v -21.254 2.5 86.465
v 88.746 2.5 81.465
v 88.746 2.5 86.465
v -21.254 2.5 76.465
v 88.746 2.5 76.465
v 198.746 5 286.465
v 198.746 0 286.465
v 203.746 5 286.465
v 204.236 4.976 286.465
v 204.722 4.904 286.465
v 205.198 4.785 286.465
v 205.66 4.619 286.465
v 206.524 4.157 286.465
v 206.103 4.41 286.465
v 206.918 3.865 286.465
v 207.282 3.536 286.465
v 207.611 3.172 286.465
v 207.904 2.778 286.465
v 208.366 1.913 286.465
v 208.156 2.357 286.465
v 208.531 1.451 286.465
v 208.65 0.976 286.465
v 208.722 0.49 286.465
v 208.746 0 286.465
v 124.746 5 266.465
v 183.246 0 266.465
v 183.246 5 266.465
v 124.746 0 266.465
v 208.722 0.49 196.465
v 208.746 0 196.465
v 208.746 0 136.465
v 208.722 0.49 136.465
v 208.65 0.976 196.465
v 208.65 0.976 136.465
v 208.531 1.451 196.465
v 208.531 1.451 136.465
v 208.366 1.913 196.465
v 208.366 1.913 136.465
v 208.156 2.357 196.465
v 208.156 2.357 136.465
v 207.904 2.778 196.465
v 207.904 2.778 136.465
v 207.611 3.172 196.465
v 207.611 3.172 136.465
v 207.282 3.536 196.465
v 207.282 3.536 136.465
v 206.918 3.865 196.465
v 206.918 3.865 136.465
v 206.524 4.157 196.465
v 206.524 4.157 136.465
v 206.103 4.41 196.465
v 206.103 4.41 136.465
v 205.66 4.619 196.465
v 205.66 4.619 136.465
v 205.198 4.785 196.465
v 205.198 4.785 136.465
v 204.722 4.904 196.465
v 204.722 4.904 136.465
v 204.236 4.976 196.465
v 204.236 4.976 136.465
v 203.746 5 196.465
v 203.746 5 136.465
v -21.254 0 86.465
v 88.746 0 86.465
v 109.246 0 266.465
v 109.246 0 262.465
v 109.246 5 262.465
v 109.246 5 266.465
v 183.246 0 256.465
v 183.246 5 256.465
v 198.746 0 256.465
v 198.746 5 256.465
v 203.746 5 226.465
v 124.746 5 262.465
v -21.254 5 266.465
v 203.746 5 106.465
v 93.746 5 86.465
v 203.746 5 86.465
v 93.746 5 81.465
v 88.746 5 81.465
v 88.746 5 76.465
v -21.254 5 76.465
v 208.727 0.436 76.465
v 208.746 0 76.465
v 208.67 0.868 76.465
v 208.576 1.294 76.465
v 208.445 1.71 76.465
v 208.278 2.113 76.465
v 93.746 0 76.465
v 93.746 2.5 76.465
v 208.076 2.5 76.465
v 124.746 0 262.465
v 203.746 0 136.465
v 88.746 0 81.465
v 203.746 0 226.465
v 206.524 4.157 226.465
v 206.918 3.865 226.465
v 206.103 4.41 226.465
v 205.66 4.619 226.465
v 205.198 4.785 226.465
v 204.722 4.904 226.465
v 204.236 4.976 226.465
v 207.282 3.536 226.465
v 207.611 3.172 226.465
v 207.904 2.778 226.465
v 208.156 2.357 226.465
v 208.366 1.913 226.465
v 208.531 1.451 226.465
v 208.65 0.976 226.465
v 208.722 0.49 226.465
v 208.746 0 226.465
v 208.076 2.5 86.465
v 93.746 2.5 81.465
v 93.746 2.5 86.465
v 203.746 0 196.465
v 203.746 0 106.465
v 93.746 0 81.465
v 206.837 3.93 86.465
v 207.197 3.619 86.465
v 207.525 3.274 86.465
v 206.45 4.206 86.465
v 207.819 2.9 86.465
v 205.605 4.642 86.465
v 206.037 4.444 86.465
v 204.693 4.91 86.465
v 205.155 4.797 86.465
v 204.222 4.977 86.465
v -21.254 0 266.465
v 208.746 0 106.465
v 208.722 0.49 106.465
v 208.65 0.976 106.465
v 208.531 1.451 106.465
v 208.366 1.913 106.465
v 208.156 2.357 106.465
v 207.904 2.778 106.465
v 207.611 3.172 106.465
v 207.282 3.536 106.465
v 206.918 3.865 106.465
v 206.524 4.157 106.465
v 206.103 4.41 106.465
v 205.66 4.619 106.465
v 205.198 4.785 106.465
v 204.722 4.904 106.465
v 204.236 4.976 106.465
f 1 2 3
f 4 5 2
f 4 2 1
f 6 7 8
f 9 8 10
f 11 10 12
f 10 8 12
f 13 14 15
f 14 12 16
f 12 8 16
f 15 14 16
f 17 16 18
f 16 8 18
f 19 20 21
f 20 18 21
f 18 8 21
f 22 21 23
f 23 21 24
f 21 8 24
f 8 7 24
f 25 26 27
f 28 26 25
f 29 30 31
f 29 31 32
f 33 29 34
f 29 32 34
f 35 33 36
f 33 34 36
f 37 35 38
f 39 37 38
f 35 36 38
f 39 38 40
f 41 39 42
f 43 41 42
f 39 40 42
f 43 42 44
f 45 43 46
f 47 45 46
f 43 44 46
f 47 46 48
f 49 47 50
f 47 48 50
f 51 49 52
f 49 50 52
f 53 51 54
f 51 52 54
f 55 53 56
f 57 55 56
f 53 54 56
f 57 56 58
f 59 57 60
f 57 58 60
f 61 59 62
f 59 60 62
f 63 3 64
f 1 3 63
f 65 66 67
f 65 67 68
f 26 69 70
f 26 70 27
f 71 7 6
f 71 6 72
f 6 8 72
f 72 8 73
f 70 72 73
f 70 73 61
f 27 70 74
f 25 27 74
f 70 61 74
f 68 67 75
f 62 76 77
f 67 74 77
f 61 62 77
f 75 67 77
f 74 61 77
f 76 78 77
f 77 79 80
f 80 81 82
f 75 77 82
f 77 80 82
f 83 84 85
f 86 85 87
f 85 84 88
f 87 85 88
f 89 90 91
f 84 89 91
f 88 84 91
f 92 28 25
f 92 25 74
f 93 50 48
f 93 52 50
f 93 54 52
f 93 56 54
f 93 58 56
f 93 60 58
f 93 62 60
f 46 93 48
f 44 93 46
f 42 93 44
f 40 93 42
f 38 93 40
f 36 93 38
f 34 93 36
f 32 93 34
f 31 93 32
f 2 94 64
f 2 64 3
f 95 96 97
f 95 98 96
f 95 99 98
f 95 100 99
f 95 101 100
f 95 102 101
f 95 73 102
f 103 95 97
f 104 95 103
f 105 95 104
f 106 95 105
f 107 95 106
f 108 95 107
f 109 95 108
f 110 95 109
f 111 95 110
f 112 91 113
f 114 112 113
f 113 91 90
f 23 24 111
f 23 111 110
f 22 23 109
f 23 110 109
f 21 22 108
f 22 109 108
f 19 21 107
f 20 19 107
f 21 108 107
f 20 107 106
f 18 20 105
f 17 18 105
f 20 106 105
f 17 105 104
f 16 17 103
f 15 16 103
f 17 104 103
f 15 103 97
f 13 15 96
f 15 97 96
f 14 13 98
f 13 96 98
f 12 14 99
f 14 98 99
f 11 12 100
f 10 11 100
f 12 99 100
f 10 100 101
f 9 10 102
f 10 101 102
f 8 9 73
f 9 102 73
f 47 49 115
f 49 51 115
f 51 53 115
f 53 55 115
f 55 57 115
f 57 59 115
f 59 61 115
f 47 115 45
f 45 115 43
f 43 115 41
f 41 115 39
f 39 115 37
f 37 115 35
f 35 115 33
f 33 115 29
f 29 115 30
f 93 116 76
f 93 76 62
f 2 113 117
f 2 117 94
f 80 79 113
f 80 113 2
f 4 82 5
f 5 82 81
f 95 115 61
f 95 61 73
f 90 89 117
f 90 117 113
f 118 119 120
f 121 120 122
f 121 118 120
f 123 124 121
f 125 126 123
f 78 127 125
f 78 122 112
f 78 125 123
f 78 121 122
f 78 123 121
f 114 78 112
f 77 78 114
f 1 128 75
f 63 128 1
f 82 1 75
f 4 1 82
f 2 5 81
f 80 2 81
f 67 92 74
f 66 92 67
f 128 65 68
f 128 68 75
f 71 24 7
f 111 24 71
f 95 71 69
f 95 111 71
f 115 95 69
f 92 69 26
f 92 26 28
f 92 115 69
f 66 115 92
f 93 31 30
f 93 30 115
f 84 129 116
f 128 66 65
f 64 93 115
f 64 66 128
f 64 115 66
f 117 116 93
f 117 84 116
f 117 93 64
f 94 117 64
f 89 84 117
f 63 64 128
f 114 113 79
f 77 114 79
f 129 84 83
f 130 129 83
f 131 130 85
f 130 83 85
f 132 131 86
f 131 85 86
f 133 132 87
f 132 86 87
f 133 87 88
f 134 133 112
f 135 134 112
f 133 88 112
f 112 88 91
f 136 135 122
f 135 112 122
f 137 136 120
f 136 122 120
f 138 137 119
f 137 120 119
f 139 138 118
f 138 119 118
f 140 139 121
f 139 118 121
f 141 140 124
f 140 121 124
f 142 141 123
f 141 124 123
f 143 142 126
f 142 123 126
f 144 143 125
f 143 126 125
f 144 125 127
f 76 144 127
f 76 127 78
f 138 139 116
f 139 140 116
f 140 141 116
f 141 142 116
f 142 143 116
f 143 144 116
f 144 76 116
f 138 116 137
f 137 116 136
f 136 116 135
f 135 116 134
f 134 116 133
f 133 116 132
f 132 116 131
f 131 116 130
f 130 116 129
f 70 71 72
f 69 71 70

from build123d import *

# Parameters (mm, degrees)
SKETCH_1_W          = 5
SKETCH_1_H          = 60
SKETCH_1_W_2        = 30
SKETCH_1_H_2        = 5
SKETCH_1_W_3        = 15
EXTRUDE_1_DEPTH     = 5
FILLET_1_R          = 5
SKETCH_2_W          = 245
SKETCH_2_H          = 125
CUT_EXTRUDE_1_DEPTH = 5
SKETCH_3_W          = 110
SKETCH_3_H          = 2.5
SKETCH_3_W_2        = 115
CUT_EXTRUDE_2_DEPTH = 10
SKETCH_4_W          = 5
SKETCH_4_H          = 5
CUT_EXTRUDE_3_DEPTH = 5


with BuildPart() as part:
    # 草圖1 → 填料-伸長1 (new body)
    with BuildSketch(Plane(origin=(0, 0, 0), x_dir=(1, 0, 0), z_dir=(0, 1, 0))):
        Polygon((198.746286718, -286.464902661), (198.746286718, -256.464902661), (183.246286718, -256.464902661), (183.246286718, -266.464902661), (124.746286718, -266.464902661), (124.746286718, -262.464902661), (109.246286718, -262.464902661), (109.246286718, -266.464902661), (-21.253713282, -266.464902661), (-21.253713282, 38.535097339), (-36.253713282, 38.535097339), (-36.253713282, 43.535097339), (203.746286718, 43.535097339), (203.746286718, -286.464902661), align=None)
        with Locations((206.246286718, -256.464902661)):
            Rectangle(SKETCH_1_W, SKETCH_1_H)
        with Locations((206.246286718, 13.535097339)):
            Rectangle(SKETCH_1_W, SKETCH_1_H)
        with Locations((188.746286718, 46.035097339)):
            Rectangle(SKETCH_1_W_2, SKETCH_1_H_2)
        with Locations((-21.253713282, 46.035097339)):
            Rectangle(SKETCH_1_W_2, SKETCH_1_H_2)
        with Locations((91.246286718, 46.035097339)):
            Rectangle(SKETCH_1_W_3, SKETCH_1_H_2)
        with Locations((76.246286718, 46.035097339)):
            Rectangle(SKETCH_1_W_3, SKETCH_1_H_2)
        with Locations((206.246286718, -166.464902661)):
            Rectangle(SKETCH_1_W, SKETCH_1_H)
        with Locations((206.246286718, -76.464902661)):
            Rectangle(SKETCH_1_W, SKETCH_1_H)
    extrude(amount=EXTRUDE_1_DEPTH)

    # 圓角1
    fillet_1_edges = [part.edges().sort_by_distance(p)[0] for p in [
        (208.746286718, 5, -13.535097339),
        (208.746286718, 5, 76.464902661),
        (208.746286718, 5, 166.464902661),
        (208.746286718, 5, 256.464902661),
    ]]
    fillet(fillet_1_edges, radius=FILLET_1_R - 0.0001)  # a hair under: the kernel refuses the full size

    # 草圖2 → 除料-伸長1 (cut)
    with BuildSketch(Plane(origin=(0, 5, 0), x_dir=(1, 0, 0), z_dir=(0, 1, 0))):
        with Locations((86.246286718, -13.964902661)):
            Rectangle(SKETCH_2_W, SKETCH_2_H)
    extrude(amount=-CUT_EXTRUDE_1_DEPTH, mode=Mode.SUBTRACT)

    # 草圖3 → 除料-伸長2 (cut)
    with BuildSketch(Plane(origin=(0, 0, 76.464902661), x_dir=(-1, 0, 0), z_dir=(0, 0, -1))):
        with Locations((-33.746286718, 1.25)):
            Rectangle(SKETCH_3_W, SKETCH_3_H)
        with Locations((-151.246286718, 3.75)):
            Rectangle(SKETCH_3_W_2, SKETCH_3_H)
    extrude(amount=-CUT_EXTRUDE_2_DEPTH, mode=Mode.SUBTRACT)

    # 草圖4 → 除料-伸長3 (cut)
    with BuildSketch(Plane(origin=(0, 0, 76.464902661), x_dir=(-1, 0, 0), z_dir=(0, 0, -1))):
        with Locations((-91.246286718, 2.5)):
            Rectangle(SKETCH_4_W, SKETCH_4_H)
    extrude(amount=-CUT_EXTRUDE_3_DEPTH, mode=Mode.SUBTRACT)


solid = part.part
